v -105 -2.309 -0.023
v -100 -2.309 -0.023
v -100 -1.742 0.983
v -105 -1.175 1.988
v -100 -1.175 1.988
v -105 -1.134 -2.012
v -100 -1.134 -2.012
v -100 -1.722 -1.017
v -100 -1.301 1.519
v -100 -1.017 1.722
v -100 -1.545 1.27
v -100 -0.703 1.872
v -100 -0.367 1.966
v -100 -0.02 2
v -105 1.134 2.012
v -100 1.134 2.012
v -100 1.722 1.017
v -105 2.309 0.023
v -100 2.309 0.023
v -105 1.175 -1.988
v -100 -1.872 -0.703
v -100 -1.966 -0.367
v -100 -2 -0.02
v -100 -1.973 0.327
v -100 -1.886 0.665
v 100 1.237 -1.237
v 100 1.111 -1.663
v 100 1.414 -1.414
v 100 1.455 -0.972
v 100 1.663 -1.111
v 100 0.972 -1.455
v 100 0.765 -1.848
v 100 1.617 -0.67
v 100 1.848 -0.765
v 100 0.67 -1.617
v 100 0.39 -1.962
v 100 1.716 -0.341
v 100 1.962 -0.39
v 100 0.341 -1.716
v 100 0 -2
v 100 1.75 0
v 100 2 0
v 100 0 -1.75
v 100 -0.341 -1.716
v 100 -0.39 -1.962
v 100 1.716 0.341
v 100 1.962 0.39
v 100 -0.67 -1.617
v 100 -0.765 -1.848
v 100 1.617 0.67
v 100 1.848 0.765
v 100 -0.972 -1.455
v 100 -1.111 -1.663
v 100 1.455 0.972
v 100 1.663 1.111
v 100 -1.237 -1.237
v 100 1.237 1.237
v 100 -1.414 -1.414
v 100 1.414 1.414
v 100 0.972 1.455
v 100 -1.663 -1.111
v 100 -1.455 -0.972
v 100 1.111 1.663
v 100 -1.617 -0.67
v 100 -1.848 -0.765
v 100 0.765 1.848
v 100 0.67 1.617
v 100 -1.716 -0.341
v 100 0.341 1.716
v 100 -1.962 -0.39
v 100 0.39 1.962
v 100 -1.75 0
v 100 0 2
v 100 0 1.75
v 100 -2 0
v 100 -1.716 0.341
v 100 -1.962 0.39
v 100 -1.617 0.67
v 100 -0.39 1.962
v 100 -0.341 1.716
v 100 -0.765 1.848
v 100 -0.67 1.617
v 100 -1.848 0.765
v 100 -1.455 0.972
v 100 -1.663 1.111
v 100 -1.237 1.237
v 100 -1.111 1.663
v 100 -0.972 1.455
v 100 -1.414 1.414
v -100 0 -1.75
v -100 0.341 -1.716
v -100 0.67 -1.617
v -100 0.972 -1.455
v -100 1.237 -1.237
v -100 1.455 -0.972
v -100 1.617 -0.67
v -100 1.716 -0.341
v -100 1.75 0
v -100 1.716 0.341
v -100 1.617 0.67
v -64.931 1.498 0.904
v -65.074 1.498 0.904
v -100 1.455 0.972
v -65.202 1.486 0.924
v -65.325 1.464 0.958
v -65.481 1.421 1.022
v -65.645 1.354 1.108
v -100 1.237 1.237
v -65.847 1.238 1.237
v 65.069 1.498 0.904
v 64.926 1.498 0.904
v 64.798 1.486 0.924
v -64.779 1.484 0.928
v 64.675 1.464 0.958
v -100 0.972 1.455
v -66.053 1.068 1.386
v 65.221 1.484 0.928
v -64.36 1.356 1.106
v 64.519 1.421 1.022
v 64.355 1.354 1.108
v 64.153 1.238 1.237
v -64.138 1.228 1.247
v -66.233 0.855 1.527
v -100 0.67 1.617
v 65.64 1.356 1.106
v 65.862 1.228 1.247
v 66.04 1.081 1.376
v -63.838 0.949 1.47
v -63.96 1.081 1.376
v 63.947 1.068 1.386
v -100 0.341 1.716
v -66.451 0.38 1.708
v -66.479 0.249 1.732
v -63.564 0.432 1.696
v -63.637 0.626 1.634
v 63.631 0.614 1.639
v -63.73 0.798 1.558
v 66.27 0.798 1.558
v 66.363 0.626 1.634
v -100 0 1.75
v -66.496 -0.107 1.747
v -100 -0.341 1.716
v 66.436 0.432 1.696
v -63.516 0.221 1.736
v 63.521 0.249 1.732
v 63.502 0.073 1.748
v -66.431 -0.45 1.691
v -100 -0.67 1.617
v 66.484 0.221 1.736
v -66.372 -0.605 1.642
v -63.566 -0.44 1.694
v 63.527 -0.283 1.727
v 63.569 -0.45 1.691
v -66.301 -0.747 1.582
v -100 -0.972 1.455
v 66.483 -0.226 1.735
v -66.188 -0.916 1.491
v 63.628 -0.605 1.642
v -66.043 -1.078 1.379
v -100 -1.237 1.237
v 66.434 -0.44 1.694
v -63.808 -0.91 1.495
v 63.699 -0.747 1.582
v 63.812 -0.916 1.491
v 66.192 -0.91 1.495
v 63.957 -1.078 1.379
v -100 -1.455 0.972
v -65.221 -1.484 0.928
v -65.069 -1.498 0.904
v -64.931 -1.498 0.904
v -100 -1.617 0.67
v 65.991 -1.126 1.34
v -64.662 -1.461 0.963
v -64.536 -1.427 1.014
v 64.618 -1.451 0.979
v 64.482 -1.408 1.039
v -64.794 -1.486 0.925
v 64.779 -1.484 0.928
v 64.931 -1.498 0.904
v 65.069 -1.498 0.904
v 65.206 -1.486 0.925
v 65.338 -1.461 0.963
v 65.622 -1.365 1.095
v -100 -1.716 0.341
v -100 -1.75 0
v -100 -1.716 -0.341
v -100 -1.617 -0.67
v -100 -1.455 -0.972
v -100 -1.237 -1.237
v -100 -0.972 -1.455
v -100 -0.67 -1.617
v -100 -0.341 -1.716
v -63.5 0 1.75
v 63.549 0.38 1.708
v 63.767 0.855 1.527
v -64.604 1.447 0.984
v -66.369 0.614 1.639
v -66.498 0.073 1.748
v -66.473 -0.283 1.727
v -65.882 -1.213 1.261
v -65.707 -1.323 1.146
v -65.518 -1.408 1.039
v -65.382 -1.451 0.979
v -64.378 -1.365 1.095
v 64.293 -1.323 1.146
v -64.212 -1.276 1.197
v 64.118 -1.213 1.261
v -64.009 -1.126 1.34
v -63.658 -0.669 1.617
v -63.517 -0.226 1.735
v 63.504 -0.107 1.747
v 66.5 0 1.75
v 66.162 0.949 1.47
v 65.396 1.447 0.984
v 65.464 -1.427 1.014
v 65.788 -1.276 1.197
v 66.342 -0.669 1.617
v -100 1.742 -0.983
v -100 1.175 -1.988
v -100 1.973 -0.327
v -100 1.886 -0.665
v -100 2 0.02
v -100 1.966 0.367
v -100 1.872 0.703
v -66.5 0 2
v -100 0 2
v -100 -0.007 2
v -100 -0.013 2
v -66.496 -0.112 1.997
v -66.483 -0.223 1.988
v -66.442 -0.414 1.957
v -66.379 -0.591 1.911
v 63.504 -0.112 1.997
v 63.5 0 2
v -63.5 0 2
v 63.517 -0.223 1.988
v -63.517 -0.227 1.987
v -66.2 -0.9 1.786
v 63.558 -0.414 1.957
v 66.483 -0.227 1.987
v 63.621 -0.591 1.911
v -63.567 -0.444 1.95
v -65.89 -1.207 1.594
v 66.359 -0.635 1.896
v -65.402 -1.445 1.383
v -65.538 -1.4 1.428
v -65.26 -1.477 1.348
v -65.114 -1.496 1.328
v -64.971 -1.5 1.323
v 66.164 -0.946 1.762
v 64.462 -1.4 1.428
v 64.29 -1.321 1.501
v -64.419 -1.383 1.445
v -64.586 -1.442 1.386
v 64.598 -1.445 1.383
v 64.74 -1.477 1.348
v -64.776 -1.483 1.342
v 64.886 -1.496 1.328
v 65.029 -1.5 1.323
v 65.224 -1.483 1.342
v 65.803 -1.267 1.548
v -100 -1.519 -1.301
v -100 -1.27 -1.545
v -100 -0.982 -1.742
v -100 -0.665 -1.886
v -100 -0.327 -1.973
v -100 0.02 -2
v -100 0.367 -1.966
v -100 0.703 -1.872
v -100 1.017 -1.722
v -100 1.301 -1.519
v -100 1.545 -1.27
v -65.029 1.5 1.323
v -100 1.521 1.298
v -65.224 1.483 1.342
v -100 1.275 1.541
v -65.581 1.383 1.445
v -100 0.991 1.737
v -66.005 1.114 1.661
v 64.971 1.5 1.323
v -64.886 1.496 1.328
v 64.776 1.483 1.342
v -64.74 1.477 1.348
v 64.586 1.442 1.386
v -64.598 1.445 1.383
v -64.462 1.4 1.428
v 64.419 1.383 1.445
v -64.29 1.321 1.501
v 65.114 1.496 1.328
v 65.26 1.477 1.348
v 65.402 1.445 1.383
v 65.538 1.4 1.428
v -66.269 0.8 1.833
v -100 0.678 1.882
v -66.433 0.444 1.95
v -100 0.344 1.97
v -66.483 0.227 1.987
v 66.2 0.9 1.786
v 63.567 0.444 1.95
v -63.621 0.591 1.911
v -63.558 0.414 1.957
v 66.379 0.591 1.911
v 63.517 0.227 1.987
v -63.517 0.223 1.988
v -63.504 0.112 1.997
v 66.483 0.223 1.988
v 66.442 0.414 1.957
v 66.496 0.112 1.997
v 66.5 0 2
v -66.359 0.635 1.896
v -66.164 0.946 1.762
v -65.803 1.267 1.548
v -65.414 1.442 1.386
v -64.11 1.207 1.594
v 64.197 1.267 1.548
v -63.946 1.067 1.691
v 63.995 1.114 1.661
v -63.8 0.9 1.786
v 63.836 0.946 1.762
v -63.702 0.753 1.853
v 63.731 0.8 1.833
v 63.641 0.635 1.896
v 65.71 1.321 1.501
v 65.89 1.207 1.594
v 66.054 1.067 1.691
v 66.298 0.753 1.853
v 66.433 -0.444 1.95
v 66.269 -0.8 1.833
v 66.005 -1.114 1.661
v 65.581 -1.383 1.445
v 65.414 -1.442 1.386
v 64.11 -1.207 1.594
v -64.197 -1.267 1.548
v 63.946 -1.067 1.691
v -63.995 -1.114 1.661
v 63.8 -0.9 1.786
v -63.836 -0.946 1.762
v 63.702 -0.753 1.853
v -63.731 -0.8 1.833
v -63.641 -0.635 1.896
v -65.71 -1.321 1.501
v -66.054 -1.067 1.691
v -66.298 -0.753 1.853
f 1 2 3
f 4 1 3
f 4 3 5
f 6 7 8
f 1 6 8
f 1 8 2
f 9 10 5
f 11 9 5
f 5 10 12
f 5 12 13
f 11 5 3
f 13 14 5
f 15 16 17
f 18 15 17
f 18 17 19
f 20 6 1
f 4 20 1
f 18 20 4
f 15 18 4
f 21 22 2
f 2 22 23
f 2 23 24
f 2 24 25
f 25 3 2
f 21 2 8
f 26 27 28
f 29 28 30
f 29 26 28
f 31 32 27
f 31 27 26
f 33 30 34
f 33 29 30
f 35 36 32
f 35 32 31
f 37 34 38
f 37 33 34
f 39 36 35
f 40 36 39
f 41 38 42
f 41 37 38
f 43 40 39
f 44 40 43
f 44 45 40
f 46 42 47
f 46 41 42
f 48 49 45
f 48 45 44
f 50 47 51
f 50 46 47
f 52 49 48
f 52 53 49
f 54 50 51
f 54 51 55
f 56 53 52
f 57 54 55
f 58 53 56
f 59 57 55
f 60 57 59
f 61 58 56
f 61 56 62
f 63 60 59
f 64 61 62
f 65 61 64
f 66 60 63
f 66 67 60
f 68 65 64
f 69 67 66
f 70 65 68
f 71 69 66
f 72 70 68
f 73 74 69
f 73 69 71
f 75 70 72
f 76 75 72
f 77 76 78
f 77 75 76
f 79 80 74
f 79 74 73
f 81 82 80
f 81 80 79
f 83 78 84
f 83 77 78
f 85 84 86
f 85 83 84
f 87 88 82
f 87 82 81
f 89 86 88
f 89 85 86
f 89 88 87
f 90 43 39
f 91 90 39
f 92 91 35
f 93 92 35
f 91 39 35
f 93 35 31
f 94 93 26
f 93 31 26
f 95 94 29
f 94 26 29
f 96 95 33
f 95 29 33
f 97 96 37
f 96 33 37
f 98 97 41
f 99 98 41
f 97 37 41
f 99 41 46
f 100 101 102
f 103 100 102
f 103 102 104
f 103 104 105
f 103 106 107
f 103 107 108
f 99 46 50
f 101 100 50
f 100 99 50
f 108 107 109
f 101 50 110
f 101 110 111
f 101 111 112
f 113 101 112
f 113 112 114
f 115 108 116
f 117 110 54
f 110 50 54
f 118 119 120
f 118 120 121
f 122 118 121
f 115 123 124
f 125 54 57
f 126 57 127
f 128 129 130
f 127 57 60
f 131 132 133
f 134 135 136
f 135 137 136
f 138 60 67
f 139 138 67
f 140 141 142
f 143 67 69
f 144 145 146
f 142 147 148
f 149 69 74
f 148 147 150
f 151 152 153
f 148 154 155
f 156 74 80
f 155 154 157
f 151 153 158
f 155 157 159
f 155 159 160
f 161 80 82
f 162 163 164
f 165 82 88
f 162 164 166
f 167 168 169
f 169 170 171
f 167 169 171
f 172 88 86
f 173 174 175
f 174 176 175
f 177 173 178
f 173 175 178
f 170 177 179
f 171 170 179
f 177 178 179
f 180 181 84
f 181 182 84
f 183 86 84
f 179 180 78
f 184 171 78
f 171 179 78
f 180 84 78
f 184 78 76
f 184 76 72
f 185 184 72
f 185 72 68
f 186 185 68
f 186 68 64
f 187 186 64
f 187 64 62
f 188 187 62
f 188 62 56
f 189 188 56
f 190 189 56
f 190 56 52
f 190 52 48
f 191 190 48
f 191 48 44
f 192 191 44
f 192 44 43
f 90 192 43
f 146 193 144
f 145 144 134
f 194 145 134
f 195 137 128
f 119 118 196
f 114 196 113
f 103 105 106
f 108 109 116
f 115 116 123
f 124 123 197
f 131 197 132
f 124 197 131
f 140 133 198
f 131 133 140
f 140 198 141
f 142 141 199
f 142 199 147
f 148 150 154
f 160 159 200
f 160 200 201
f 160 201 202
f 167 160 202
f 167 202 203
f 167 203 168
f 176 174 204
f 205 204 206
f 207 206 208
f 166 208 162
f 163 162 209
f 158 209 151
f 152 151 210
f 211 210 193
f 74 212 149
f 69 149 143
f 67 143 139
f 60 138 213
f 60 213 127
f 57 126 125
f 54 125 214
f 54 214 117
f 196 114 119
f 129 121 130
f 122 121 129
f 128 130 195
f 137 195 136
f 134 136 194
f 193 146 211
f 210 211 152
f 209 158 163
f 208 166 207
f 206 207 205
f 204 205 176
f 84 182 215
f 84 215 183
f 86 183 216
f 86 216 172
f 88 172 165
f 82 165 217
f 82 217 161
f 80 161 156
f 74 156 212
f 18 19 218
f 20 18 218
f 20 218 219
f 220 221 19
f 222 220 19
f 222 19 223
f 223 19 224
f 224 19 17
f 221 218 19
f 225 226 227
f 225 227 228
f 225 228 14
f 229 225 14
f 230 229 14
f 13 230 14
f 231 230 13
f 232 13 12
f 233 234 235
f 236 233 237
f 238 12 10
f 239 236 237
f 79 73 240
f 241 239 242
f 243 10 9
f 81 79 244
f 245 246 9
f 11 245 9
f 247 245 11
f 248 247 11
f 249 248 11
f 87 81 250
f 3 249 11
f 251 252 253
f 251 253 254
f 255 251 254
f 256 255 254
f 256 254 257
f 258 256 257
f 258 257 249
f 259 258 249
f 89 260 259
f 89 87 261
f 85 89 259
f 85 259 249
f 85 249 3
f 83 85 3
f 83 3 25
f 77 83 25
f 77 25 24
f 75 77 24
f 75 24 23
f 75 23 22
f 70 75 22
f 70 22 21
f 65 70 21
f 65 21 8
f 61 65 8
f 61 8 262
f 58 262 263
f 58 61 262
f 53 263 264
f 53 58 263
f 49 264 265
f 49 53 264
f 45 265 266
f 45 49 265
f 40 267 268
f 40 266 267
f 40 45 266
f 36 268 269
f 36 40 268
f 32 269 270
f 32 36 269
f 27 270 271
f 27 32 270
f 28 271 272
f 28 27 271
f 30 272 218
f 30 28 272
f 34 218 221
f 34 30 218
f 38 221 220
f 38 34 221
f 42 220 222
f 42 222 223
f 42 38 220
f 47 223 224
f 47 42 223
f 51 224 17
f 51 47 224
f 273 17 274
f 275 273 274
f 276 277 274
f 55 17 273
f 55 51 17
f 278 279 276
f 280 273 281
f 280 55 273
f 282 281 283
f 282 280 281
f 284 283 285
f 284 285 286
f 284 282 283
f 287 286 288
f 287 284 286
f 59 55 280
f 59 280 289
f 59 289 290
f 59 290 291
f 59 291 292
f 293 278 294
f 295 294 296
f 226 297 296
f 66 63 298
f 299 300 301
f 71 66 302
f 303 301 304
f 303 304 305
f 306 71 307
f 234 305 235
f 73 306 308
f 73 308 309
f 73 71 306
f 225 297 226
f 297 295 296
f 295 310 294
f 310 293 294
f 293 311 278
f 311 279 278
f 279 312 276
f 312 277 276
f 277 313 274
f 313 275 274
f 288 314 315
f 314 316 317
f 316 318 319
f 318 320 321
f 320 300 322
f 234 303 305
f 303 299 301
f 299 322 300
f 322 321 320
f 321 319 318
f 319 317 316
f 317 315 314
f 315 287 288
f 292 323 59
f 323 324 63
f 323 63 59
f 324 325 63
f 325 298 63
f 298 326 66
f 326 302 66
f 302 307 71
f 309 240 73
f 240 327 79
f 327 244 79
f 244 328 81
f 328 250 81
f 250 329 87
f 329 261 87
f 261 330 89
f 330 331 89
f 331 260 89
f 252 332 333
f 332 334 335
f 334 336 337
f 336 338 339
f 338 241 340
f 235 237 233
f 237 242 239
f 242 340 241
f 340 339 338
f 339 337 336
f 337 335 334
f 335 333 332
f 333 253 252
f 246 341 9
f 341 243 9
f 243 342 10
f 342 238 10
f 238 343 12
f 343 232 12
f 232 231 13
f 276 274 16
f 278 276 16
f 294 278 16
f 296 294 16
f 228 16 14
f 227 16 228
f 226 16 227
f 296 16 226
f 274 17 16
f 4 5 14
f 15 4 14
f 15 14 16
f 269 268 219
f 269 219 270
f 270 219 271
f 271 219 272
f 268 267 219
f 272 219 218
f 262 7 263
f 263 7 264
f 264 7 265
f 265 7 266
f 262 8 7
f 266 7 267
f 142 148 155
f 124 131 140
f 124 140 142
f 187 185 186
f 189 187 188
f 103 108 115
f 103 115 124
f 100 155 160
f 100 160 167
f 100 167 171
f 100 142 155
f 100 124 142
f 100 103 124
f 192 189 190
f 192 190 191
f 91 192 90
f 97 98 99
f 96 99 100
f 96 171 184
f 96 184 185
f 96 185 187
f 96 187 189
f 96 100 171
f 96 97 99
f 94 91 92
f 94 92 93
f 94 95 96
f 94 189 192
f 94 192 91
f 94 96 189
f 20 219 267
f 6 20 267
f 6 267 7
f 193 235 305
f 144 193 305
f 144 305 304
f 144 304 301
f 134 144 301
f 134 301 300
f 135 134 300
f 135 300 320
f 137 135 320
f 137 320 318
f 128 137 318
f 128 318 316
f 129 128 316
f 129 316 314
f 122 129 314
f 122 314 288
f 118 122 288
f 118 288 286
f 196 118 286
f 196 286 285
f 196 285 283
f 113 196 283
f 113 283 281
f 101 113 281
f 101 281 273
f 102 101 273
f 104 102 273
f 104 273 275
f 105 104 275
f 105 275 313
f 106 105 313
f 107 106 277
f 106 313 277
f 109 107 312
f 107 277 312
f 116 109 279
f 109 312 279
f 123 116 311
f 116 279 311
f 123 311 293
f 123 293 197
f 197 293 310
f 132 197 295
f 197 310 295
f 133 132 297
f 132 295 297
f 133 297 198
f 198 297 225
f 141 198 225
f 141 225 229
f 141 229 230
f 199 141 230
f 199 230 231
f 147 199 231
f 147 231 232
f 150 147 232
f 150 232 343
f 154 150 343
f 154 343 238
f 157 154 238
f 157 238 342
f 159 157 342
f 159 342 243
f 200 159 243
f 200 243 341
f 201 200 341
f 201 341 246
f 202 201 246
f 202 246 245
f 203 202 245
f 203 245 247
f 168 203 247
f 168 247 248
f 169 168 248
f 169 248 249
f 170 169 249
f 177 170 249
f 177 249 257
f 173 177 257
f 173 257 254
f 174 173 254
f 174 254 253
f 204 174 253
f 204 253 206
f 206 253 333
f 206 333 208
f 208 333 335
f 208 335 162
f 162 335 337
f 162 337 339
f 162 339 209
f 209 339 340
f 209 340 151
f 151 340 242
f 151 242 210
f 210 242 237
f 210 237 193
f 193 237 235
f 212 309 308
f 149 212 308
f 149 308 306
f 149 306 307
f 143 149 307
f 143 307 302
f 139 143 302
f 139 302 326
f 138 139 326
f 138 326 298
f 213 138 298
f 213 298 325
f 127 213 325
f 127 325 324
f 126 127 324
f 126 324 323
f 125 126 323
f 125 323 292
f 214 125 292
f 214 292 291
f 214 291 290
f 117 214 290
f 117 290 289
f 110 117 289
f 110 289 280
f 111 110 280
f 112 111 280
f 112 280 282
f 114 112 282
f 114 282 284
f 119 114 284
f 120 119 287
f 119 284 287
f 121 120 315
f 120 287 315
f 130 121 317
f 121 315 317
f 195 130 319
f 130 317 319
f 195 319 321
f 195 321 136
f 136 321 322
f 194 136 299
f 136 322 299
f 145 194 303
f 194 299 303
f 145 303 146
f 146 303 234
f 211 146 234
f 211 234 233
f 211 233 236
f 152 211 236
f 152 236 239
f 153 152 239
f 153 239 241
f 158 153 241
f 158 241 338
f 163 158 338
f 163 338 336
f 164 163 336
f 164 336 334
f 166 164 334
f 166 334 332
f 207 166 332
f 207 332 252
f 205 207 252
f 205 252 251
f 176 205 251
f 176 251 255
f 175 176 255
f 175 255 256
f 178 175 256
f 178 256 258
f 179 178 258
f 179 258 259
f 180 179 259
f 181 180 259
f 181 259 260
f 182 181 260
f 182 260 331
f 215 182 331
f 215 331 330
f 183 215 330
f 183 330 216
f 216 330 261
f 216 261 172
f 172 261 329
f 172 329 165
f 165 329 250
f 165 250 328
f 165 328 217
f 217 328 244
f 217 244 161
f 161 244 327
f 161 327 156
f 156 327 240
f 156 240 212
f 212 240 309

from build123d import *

# Parameters (mm, degrees)
SWEEP1_PROFILE_R    = 2
BOSS_EXTRUDE1_DEPTH = 5
SKETCH10_R          = 1.75
CUT_EXTRUDE1_DEPTH  = 200
CUT_EXTRUDE3_REACH  = 6.012
SKETCH35_R          = 1.5


with BuildPart() as part:
    # Sweep1: sweep along a path in Sketch2
    with BuildLine(Plane(origin=(0, 0, 0), x_dir=(1, 0, 0), z_dir=(0, 1, 0))) as sweep1_path:
        Line((-100, 0), (100, 0))
    # Sweep1 profile (on start of the path) → Sweep1 (sweep)
    with BuildSketch(Plane(origin=(-100, 0, 0), x_dir=(0, 0, 1), z_dir=(1, 0, 0))):
        Circle(SWEEP1_PROFILE_R)
    sweep(path=sweep1_path.line)

    # Sketch9 → Boss-Extrude1 (add)
    with BuildSketch(Plane.ZY.offset(100)):
        Polygon((1.98826653, -1.174789146), (2.01153051, 1.134494752), (0.023263979, 2.309283898), (-1.98826653, 1.174789146), (-2.01153051, -1.134494752), (-0.023263979, -2.309283898), align=None)
    extrude(amount=BOSS_EXTRUDE1_DEPTH)

    # Sketch10 → Cut-Extrude1 (cut)
    with BuildSketch(Plane(origin=(100, 0, 0), x_dir=(0, 0, -1), z_dir=(1, 0, 0))):
        Circle(SKETCH10_R)
    extrude(amount=-CUT_EXTRUDE1_DEPTH, mode=Mode.SUBTRACT)

    # Sketch35 → Cut-Extrude3 (cut, up to next)
    with BuildSketch(Plane.XY.offset(2), mode=Mode.PRIVATE) as cut_extrude3_sk1:
        with Locations((65, 0)):
            Circle(SKETCH35_R)
    cut_extrude3_tool1 = extrude(cut_extrude3_sk1.sketch, amount=-CUT_EXTRUDE3_REACH, mode=Mode.PRIVATE) & part.part
    add(cut_extrude3_tool1.solids().sort_by_distance((65, 0, 2))[0], mode=Mode.SUBTRACT)
    # Sketch35 → Cut-Extrude3 (cut, up to next)
    with BuildSketch(Plane.XY.offset(2), mode=Mode.PRIVATE) as cut_extrude3_sk2:
        with Locations((-65, 0)):
            Circle(SKETCH35_R)
    cut_extrude3_tool2 = extrude(cut_extrude3_sk2.sketch, amount=-CUT_EXTRUDE3_REACH, mode=Mode.PRIVATE) & part.part
    add(cut_extrude3_tool2.solids().sort_by_distance((-65, 0, 2))[0], mode=Mode.SUBTRACT)


solid = part.part
